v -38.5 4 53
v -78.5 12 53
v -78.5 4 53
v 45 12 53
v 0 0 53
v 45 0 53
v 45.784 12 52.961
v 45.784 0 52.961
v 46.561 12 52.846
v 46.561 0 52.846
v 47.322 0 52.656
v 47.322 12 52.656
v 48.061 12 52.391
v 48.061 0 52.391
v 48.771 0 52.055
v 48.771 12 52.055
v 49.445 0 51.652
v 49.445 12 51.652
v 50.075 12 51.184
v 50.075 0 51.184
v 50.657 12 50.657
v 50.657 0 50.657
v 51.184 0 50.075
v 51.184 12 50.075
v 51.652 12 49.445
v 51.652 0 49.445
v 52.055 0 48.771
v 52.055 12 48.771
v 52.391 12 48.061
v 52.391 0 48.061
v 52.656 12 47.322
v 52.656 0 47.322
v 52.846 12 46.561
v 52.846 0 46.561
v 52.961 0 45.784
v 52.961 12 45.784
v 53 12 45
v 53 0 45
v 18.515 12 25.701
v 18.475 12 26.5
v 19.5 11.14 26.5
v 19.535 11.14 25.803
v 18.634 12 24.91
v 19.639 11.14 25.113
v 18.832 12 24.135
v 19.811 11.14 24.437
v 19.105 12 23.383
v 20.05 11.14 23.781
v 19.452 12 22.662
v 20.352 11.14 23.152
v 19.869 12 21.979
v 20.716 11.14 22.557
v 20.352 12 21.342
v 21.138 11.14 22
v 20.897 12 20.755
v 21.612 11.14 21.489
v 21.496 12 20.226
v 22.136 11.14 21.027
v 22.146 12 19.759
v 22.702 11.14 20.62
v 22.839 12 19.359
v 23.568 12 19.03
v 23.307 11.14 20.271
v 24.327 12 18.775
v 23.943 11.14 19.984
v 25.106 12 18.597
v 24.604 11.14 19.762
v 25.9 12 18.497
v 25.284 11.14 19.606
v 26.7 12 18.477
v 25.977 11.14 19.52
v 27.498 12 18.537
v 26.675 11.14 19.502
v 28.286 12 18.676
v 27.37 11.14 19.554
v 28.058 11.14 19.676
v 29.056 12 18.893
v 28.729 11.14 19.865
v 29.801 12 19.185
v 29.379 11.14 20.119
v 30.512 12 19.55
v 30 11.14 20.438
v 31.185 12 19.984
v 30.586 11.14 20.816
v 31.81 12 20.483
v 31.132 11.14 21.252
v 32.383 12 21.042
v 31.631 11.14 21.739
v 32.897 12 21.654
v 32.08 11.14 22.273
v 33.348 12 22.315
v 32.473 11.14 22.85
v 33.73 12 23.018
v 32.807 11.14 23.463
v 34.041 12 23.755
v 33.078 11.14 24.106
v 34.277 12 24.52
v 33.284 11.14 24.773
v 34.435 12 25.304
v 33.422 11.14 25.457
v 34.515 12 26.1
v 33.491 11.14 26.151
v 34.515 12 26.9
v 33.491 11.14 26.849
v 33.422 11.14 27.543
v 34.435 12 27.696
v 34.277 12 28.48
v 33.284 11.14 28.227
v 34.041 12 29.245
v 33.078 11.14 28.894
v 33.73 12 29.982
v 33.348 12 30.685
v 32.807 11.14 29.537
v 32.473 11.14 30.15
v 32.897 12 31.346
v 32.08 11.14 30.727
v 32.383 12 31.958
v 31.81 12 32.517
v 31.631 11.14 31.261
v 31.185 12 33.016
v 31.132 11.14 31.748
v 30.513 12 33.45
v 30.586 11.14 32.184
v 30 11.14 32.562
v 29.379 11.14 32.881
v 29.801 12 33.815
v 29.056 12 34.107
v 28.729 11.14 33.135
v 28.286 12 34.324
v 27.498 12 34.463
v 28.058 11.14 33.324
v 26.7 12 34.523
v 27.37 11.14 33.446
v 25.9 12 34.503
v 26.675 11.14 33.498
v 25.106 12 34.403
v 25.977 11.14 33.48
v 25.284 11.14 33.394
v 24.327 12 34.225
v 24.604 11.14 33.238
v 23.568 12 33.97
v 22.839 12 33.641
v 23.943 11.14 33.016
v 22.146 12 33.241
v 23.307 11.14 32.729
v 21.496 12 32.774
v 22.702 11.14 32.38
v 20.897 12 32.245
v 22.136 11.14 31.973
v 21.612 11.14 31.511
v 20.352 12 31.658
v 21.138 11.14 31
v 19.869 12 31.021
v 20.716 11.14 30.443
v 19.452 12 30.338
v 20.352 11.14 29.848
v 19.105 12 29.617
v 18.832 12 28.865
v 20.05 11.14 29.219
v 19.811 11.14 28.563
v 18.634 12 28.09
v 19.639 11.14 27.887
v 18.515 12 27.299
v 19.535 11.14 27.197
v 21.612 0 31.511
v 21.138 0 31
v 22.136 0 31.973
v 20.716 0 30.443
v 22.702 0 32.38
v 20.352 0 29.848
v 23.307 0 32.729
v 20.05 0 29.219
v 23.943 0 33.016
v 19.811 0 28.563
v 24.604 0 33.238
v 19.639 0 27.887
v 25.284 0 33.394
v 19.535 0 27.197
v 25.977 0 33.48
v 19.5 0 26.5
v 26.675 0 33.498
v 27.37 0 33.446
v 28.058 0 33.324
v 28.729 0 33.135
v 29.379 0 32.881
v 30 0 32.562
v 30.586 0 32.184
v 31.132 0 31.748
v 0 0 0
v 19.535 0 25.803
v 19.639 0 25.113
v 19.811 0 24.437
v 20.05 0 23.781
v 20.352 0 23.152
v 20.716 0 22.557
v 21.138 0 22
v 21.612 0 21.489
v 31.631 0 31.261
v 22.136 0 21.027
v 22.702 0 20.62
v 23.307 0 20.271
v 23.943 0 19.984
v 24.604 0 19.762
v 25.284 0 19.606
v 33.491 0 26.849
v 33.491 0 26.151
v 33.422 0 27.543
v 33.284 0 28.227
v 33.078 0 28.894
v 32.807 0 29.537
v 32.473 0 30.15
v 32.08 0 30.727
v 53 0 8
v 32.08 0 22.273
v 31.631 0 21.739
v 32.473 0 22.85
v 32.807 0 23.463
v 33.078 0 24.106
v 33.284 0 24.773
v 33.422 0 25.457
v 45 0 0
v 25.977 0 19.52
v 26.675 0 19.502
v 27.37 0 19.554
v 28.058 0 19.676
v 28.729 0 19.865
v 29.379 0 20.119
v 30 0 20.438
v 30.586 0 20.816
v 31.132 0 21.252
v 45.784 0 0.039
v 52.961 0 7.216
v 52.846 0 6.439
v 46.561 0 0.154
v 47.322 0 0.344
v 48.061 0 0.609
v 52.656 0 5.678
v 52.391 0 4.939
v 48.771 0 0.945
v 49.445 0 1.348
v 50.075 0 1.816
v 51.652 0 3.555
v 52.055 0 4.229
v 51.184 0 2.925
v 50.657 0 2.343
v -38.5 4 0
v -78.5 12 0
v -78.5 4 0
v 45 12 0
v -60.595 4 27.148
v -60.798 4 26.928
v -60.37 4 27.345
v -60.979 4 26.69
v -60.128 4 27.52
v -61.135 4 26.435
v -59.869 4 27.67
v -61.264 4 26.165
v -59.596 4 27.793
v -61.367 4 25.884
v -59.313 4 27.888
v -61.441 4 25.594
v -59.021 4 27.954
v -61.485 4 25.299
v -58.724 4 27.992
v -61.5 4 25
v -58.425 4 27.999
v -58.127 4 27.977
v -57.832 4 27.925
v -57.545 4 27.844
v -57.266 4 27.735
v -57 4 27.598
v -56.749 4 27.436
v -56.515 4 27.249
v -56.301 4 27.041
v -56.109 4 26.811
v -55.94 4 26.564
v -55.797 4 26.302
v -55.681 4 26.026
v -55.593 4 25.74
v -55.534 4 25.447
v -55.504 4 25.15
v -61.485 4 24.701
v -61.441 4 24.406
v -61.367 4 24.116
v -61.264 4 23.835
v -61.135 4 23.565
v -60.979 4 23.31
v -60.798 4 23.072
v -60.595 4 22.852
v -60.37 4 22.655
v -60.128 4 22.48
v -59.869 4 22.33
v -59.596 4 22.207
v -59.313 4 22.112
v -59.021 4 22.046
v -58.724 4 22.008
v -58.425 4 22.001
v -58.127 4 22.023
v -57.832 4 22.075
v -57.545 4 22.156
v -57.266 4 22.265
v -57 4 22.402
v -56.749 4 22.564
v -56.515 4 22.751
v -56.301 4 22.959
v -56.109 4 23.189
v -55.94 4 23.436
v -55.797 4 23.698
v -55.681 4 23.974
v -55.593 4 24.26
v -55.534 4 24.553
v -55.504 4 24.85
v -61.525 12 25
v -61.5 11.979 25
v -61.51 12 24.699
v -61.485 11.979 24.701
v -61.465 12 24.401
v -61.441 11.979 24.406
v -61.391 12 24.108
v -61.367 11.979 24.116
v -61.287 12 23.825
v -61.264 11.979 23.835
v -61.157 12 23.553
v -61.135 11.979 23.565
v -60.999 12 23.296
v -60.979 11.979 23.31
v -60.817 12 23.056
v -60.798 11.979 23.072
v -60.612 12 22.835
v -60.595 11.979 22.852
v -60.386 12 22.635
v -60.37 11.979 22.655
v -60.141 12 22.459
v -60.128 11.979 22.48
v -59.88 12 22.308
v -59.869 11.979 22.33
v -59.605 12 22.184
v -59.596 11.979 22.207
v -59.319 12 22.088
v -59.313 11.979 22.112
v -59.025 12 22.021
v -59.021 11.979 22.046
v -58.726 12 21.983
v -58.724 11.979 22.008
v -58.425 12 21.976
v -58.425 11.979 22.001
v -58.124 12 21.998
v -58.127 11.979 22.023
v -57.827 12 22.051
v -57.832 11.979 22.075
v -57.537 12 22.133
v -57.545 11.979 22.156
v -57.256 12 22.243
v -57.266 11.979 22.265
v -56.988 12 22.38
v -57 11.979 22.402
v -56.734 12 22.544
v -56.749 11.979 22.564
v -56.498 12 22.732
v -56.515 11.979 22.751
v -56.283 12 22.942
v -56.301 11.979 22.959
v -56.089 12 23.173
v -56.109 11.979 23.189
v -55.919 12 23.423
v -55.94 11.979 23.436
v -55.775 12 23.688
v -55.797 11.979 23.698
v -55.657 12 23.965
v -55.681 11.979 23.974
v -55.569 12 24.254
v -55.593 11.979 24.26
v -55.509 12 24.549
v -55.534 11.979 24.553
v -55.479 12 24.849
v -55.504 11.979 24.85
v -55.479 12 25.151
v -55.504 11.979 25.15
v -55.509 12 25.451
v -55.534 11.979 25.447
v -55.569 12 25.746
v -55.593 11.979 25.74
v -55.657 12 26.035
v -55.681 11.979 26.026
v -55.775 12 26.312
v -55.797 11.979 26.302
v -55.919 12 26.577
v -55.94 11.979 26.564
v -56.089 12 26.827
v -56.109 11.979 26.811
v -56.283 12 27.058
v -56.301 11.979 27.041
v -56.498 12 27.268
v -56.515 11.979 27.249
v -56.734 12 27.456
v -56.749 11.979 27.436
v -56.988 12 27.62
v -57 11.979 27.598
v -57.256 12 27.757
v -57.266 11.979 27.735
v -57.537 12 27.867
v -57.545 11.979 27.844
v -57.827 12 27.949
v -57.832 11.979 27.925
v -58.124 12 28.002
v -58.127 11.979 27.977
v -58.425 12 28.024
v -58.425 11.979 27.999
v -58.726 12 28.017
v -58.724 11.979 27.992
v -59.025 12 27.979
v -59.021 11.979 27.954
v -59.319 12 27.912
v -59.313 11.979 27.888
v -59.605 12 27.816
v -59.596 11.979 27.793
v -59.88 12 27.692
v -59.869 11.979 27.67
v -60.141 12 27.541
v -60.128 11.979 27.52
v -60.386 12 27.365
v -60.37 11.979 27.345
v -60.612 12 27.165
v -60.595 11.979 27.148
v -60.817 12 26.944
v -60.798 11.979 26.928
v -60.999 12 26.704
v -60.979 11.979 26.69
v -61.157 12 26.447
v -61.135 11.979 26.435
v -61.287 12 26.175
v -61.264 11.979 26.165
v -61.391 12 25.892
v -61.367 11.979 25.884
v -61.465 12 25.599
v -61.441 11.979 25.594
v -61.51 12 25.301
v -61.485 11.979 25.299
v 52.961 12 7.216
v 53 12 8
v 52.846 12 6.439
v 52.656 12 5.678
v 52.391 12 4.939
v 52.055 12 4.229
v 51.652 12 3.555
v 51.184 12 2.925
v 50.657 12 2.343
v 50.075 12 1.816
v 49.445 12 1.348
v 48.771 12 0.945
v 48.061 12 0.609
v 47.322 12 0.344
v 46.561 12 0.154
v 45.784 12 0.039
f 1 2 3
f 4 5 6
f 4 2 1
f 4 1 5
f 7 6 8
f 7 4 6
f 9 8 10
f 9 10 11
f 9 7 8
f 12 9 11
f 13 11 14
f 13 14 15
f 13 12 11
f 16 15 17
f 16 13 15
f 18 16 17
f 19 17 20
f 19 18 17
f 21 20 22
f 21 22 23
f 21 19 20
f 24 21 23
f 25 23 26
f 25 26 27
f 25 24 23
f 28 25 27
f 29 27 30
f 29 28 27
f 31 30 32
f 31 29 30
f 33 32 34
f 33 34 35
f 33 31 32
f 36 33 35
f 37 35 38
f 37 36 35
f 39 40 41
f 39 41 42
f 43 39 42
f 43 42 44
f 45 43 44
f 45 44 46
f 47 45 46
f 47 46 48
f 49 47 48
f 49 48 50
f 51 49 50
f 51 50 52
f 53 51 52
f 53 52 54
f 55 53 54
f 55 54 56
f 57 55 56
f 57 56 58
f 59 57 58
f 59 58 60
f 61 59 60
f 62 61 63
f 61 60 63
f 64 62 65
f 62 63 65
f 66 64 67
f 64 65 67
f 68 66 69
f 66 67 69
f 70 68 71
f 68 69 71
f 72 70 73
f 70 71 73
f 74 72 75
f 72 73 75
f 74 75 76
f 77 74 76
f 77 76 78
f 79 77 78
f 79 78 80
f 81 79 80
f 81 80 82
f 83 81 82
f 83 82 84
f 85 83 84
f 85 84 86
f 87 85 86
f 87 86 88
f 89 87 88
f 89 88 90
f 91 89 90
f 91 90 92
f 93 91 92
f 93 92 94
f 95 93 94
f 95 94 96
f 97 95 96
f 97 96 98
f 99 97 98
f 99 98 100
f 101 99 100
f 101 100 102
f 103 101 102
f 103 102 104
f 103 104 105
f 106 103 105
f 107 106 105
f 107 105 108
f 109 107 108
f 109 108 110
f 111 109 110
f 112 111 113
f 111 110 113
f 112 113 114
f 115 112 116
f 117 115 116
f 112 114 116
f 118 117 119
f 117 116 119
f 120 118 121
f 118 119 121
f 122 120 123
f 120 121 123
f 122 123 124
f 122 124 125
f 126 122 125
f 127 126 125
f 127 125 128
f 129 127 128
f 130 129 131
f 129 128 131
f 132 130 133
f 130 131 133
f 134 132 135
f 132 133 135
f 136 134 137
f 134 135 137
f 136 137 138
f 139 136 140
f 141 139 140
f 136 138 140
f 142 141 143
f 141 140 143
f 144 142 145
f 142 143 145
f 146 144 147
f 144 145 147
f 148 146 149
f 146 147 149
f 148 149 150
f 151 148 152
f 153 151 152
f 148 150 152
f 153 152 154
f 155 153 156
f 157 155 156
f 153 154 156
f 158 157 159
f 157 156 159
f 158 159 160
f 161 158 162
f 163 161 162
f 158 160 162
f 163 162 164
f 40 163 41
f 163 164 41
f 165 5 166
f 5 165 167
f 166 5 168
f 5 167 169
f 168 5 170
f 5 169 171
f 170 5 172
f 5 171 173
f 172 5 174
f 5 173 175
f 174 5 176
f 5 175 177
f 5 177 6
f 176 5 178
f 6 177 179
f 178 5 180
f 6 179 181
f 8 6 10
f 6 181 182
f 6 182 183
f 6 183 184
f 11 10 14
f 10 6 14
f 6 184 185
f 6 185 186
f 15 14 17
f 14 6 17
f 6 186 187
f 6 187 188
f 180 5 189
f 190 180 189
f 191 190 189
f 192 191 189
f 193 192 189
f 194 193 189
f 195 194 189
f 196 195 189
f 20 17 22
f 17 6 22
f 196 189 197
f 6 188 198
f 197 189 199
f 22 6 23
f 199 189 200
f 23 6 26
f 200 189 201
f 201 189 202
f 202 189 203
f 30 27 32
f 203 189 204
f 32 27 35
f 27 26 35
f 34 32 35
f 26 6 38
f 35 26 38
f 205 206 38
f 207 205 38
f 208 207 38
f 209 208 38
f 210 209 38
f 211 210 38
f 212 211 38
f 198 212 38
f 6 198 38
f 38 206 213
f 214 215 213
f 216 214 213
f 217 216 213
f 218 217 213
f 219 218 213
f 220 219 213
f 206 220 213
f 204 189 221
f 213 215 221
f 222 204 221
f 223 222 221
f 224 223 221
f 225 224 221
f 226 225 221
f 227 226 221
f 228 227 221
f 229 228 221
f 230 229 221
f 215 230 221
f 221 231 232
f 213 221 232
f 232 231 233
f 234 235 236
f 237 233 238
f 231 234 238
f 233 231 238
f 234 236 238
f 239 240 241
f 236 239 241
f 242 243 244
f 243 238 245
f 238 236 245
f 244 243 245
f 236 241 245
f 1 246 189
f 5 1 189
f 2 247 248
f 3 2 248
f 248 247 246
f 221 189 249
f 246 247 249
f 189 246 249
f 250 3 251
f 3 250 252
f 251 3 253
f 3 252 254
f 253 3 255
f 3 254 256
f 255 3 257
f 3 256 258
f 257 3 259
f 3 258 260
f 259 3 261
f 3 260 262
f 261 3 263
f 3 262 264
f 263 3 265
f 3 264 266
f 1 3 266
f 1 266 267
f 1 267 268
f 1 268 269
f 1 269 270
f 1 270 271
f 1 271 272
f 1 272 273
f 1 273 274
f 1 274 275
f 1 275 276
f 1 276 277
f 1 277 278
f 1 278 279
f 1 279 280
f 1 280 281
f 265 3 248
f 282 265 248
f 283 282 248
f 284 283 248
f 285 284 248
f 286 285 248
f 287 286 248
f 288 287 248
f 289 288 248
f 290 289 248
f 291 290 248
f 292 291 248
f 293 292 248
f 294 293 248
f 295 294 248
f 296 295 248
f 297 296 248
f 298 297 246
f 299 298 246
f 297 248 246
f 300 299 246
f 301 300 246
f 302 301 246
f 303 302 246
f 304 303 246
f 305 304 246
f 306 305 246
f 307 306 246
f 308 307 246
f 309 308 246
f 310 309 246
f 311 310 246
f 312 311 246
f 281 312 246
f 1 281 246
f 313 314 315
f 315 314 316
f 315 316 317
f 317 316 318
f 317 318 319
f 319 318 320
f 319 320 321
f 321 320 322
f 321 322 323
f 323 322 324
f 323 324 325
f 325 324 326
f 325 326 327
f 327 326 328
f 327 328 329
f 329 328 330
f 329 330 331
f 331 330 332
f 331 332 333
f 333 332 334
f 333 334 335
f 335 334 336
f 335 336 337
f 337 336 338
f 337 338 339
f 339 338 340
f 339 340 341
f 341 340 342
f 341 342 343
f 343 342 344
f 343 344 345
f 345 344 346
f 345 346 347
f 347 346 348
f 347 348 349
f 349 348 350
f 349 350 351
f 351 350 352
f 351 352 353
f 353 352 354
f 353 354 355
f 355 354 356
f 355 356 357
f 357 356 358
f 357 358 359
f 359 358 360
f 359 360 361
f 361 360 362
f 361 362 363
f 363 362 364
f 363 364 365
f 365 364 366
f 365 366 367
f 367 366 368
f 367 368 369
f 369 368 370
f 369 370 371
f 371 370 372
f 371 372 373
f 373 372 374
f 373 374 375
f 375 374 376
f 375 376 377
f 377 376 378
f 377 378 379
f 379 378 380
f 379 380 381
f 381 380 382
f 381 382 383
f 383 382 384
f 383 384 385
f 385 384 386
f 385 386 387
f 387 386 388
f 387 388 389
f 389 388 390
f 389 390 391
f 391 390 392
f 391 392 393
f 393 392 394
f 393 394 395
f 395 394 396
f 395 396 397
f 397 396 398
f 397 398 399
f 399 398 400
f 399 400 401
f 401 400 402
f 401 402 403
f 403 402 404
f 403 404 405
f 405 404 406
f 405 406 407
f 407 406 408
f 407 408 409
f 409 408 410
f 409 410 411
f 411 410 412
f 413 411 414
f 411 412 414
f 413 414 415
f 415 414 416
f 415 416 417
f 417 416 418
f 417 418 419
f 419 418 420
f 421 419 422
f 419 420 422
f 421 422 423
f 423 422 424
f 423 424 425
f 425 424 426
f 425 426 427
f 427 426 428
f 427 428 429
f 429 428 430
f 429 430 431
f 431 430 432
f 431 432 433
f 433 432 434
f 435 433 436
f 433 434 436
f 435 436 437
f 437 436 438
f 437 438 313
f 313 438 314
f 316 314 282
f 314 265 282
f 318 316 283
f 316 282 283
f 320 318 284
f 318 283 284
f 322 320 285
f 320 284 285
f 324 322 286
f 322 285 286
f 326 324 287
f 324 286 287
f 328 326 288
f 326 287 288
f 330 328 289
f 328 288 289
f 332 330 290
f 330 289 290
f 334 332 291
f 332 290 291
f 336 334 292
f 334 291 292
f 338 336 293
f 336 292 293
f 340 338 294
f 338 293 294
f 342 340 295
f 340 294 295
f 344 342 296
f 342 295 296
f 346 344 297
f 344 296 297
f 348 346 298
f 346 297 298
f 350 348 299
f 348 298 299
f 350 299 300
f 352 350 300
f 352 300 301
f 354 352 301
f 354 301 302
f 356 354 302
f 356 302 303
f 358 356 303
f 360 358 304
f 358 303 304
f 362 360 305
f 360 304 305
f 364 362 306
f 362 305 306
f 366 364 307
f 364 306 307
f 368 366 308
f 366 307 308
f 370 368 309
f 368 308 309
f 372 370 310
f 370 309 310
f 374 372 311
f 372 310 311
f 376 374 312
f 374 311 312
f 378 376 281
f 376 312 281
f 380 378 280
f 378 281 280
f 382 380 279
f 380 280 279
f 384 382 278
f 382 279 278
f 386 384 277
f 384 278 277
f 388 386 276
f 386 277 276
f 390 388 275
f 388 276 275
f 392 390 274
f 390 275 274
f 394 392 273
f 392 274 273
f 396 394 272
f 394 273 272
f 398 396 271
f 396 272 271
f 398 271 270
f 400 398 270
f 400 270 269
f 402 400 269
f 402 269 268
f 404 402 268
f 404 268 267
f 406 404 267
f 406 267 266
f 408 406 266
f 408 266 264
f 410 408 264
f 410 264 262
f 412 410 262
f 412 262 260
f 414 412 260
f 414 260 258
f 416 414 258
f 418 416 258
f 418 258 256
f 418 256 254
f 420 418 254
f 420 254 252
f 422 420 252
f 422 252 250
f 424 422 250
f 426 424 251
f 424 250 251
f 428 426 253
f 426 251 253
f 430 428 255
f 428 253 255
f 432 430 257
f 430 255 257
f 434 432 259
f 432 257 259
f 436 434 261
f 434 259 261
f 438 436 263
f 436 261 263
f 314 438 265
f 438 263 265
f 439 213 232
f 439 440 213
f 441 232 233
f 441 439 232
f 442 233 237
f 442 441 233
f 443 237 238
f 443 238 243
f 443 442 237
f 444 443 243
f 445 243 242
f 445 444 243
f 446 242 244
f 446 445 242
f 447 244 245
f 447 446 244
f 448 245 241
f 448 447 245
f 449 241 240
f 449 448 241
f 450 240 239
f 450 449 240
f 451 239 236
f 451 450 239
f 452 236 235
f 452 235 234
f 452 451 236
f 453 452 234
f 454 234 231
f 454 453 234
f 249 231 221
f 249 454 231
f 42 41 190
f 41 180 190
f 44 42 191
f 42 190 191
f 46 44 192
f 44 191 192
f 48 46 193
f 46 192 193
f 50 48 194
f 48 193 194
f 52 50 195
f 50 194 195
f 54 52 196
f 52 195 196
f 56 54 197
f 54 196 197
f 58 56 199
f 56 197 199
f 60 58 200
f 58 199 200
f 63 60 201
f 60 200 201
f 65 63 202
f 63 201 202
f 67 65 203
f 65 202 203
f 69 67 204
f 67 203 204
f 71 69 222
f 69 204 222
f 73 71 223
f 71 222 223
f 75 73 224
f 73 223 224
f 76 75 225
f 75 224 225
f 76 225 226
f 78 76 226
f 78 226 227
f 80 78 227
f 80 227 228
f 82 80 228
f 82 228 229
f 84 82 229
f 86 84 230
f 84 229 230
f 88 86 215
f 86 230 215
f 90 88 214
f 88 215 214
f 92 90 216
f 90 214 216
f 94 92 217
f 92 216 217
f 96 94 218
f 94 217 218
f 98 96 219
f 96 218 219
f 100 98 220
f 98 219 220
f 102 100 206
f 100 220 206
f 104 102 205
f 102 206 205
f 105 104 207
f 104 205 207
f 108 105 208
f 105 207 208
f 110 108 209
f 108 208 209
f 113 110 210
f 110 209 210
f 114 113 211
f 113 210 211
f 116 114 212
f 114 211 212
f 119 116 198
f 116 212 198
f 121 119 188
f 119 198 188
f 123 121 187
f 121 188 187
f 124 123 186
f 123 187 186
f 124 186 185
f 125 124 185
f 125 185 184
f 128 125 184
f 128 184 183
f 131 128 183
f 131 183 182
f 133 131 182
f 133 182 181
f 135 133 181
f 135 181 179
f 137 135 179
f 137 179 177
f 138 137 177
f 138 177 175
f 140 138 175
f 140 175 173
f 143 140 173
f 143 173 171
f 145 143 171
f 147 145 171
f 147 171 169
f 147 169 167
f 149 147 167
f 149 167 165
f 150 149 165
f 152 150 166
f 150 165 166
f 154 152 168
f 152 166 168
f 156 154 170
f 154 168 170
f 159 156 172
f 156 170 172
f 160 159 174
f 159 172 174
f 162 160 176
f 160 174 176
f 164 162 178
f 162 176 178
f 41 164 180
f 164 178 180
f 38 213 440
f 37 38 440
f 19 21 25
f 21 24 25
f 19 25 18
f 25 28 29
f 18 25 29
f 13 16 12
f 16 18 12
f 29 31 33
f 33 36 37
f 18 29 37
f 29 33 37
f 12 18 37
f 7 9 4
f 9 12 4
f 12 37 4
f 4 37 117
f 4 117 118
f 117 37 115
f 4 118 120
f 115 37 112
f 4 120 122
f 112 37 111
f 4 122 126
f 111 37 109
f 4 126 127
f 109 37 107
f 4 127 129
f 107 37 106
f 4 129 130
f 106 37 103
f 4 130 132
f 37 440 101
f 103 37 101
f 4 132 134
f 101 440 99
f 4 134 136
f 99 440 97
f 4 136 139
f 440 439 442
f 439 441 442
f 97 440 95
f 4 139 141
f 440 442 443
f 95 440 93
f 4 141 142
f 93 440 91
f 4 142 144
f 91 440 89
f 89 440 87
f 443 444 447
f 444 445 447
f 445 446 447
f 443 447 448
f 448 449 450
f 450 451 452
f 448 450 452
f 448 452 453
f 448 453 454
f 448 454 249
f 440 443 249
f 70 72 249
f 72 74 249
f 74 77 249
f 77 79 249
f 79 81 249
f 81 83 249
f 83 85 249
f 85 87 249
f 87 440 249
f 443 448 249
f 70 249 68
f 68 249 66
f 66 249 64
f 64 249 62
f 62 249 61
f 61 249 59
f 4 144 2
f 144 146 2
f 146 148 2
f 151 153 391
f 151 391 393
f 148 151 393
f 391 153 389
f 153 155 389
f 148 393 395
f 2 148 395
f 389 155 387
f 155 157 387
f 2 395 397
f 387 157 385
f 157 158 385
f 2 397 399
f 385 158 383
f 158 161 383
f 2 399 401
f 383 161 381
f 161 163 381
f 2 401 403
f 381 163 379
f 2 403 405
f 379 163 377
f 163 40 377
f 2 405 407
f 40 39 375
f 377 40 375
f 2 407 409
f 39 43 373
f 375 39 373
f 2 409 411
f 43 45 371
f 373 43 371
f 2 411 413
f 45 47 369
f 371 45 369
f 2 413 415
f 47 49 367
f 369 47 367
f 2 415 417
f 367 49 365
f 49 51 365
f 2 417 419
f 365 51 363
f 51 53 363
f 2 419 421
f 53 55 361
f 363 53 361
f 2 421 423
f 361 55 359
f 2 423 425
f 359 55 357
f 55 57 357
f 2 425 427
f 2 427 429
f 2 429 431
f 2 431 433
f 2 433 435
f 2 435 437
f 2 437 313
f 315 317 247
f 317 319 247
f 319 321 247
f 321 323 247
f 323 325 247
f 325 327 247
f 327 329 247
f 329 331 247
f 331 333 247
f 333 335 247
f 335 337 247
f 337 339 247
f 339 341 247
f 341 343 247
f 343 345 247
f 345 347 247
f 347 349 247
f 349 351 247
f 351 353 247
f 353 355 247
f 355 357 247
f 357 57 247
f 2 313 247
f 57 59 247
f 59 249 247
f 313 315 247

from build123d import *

# Parameters (mm, degrees)
EXTRUDE_1_DEPTH        = 53
FILLET_1_R             = 8
F_16_0MM_1_D           = 14
F_16_0MM_1_CSINK_D     = 16.05
F_16_0MM_1_CSINK_ANGLE = 100
F_6_0MM_1_D            = 6
F_6_0MM_1_CSINK_D      = 6.05
F_6_0MM_1_CSINK_ANGLE  = 100
FILLET_4_R             = 8


with BuildPart() as part:
    # 草图2 → 凸台-拉伸1 (new body)
    with BuildSketch(Plane.XY):
        Polygon((0, 0), (53, 0), (53, 12), (-78.5, 12), (-78.5, 4), (-38.5, 4), align=None)
    extrude(amount=EXTRUDE_1_DEPTH)

    # 圆角1
    fillet_1_edges = [part.edges().sort_by_distance(p)[0] for p in [
        (53, 6, 0),
    ]]
    fillet(fillet_1_edges, radius=FILLET_1_R)

    # Ø16.0mm 暗销孔1 (through all)
    with Locations(Plane(origin=(0, 12, 0), x_dir=(1, 0, 0), z_dir=(0, 1, 0))):
        with Locations((26.5, -26.5)):
            CounterSinkHole(F_16_0MM_1_D / 2, F_16_0MM_1_CSINK_D / 2, counter_sink_angle=F_16_0MM_1_CSINK_ANGLE)

    # Ø6.0mm 暗销孔1 (through all)
    with Locations(Plane(origin=(0, 12, 0), x_dir=(1, 0, 0), z_dir=(0, 1, 0))):
        with Locations((-58.5, -25)):
            CounterSinkHole(F_6_0MM_1_D / 2, F_6_0MM_1_CSINK_D / 2, counter_sink_angle=F_6_0MM_1_CSINK_ANGLE)

    # 圆角4
    fillet_4_edges = [part.edges().sort_by_distance(p)[0] for p in [
        (53, 6, 53),
    ]]
    fillet(fillet_4_edges, radius=FILLET_4_R)


solid = part.part
